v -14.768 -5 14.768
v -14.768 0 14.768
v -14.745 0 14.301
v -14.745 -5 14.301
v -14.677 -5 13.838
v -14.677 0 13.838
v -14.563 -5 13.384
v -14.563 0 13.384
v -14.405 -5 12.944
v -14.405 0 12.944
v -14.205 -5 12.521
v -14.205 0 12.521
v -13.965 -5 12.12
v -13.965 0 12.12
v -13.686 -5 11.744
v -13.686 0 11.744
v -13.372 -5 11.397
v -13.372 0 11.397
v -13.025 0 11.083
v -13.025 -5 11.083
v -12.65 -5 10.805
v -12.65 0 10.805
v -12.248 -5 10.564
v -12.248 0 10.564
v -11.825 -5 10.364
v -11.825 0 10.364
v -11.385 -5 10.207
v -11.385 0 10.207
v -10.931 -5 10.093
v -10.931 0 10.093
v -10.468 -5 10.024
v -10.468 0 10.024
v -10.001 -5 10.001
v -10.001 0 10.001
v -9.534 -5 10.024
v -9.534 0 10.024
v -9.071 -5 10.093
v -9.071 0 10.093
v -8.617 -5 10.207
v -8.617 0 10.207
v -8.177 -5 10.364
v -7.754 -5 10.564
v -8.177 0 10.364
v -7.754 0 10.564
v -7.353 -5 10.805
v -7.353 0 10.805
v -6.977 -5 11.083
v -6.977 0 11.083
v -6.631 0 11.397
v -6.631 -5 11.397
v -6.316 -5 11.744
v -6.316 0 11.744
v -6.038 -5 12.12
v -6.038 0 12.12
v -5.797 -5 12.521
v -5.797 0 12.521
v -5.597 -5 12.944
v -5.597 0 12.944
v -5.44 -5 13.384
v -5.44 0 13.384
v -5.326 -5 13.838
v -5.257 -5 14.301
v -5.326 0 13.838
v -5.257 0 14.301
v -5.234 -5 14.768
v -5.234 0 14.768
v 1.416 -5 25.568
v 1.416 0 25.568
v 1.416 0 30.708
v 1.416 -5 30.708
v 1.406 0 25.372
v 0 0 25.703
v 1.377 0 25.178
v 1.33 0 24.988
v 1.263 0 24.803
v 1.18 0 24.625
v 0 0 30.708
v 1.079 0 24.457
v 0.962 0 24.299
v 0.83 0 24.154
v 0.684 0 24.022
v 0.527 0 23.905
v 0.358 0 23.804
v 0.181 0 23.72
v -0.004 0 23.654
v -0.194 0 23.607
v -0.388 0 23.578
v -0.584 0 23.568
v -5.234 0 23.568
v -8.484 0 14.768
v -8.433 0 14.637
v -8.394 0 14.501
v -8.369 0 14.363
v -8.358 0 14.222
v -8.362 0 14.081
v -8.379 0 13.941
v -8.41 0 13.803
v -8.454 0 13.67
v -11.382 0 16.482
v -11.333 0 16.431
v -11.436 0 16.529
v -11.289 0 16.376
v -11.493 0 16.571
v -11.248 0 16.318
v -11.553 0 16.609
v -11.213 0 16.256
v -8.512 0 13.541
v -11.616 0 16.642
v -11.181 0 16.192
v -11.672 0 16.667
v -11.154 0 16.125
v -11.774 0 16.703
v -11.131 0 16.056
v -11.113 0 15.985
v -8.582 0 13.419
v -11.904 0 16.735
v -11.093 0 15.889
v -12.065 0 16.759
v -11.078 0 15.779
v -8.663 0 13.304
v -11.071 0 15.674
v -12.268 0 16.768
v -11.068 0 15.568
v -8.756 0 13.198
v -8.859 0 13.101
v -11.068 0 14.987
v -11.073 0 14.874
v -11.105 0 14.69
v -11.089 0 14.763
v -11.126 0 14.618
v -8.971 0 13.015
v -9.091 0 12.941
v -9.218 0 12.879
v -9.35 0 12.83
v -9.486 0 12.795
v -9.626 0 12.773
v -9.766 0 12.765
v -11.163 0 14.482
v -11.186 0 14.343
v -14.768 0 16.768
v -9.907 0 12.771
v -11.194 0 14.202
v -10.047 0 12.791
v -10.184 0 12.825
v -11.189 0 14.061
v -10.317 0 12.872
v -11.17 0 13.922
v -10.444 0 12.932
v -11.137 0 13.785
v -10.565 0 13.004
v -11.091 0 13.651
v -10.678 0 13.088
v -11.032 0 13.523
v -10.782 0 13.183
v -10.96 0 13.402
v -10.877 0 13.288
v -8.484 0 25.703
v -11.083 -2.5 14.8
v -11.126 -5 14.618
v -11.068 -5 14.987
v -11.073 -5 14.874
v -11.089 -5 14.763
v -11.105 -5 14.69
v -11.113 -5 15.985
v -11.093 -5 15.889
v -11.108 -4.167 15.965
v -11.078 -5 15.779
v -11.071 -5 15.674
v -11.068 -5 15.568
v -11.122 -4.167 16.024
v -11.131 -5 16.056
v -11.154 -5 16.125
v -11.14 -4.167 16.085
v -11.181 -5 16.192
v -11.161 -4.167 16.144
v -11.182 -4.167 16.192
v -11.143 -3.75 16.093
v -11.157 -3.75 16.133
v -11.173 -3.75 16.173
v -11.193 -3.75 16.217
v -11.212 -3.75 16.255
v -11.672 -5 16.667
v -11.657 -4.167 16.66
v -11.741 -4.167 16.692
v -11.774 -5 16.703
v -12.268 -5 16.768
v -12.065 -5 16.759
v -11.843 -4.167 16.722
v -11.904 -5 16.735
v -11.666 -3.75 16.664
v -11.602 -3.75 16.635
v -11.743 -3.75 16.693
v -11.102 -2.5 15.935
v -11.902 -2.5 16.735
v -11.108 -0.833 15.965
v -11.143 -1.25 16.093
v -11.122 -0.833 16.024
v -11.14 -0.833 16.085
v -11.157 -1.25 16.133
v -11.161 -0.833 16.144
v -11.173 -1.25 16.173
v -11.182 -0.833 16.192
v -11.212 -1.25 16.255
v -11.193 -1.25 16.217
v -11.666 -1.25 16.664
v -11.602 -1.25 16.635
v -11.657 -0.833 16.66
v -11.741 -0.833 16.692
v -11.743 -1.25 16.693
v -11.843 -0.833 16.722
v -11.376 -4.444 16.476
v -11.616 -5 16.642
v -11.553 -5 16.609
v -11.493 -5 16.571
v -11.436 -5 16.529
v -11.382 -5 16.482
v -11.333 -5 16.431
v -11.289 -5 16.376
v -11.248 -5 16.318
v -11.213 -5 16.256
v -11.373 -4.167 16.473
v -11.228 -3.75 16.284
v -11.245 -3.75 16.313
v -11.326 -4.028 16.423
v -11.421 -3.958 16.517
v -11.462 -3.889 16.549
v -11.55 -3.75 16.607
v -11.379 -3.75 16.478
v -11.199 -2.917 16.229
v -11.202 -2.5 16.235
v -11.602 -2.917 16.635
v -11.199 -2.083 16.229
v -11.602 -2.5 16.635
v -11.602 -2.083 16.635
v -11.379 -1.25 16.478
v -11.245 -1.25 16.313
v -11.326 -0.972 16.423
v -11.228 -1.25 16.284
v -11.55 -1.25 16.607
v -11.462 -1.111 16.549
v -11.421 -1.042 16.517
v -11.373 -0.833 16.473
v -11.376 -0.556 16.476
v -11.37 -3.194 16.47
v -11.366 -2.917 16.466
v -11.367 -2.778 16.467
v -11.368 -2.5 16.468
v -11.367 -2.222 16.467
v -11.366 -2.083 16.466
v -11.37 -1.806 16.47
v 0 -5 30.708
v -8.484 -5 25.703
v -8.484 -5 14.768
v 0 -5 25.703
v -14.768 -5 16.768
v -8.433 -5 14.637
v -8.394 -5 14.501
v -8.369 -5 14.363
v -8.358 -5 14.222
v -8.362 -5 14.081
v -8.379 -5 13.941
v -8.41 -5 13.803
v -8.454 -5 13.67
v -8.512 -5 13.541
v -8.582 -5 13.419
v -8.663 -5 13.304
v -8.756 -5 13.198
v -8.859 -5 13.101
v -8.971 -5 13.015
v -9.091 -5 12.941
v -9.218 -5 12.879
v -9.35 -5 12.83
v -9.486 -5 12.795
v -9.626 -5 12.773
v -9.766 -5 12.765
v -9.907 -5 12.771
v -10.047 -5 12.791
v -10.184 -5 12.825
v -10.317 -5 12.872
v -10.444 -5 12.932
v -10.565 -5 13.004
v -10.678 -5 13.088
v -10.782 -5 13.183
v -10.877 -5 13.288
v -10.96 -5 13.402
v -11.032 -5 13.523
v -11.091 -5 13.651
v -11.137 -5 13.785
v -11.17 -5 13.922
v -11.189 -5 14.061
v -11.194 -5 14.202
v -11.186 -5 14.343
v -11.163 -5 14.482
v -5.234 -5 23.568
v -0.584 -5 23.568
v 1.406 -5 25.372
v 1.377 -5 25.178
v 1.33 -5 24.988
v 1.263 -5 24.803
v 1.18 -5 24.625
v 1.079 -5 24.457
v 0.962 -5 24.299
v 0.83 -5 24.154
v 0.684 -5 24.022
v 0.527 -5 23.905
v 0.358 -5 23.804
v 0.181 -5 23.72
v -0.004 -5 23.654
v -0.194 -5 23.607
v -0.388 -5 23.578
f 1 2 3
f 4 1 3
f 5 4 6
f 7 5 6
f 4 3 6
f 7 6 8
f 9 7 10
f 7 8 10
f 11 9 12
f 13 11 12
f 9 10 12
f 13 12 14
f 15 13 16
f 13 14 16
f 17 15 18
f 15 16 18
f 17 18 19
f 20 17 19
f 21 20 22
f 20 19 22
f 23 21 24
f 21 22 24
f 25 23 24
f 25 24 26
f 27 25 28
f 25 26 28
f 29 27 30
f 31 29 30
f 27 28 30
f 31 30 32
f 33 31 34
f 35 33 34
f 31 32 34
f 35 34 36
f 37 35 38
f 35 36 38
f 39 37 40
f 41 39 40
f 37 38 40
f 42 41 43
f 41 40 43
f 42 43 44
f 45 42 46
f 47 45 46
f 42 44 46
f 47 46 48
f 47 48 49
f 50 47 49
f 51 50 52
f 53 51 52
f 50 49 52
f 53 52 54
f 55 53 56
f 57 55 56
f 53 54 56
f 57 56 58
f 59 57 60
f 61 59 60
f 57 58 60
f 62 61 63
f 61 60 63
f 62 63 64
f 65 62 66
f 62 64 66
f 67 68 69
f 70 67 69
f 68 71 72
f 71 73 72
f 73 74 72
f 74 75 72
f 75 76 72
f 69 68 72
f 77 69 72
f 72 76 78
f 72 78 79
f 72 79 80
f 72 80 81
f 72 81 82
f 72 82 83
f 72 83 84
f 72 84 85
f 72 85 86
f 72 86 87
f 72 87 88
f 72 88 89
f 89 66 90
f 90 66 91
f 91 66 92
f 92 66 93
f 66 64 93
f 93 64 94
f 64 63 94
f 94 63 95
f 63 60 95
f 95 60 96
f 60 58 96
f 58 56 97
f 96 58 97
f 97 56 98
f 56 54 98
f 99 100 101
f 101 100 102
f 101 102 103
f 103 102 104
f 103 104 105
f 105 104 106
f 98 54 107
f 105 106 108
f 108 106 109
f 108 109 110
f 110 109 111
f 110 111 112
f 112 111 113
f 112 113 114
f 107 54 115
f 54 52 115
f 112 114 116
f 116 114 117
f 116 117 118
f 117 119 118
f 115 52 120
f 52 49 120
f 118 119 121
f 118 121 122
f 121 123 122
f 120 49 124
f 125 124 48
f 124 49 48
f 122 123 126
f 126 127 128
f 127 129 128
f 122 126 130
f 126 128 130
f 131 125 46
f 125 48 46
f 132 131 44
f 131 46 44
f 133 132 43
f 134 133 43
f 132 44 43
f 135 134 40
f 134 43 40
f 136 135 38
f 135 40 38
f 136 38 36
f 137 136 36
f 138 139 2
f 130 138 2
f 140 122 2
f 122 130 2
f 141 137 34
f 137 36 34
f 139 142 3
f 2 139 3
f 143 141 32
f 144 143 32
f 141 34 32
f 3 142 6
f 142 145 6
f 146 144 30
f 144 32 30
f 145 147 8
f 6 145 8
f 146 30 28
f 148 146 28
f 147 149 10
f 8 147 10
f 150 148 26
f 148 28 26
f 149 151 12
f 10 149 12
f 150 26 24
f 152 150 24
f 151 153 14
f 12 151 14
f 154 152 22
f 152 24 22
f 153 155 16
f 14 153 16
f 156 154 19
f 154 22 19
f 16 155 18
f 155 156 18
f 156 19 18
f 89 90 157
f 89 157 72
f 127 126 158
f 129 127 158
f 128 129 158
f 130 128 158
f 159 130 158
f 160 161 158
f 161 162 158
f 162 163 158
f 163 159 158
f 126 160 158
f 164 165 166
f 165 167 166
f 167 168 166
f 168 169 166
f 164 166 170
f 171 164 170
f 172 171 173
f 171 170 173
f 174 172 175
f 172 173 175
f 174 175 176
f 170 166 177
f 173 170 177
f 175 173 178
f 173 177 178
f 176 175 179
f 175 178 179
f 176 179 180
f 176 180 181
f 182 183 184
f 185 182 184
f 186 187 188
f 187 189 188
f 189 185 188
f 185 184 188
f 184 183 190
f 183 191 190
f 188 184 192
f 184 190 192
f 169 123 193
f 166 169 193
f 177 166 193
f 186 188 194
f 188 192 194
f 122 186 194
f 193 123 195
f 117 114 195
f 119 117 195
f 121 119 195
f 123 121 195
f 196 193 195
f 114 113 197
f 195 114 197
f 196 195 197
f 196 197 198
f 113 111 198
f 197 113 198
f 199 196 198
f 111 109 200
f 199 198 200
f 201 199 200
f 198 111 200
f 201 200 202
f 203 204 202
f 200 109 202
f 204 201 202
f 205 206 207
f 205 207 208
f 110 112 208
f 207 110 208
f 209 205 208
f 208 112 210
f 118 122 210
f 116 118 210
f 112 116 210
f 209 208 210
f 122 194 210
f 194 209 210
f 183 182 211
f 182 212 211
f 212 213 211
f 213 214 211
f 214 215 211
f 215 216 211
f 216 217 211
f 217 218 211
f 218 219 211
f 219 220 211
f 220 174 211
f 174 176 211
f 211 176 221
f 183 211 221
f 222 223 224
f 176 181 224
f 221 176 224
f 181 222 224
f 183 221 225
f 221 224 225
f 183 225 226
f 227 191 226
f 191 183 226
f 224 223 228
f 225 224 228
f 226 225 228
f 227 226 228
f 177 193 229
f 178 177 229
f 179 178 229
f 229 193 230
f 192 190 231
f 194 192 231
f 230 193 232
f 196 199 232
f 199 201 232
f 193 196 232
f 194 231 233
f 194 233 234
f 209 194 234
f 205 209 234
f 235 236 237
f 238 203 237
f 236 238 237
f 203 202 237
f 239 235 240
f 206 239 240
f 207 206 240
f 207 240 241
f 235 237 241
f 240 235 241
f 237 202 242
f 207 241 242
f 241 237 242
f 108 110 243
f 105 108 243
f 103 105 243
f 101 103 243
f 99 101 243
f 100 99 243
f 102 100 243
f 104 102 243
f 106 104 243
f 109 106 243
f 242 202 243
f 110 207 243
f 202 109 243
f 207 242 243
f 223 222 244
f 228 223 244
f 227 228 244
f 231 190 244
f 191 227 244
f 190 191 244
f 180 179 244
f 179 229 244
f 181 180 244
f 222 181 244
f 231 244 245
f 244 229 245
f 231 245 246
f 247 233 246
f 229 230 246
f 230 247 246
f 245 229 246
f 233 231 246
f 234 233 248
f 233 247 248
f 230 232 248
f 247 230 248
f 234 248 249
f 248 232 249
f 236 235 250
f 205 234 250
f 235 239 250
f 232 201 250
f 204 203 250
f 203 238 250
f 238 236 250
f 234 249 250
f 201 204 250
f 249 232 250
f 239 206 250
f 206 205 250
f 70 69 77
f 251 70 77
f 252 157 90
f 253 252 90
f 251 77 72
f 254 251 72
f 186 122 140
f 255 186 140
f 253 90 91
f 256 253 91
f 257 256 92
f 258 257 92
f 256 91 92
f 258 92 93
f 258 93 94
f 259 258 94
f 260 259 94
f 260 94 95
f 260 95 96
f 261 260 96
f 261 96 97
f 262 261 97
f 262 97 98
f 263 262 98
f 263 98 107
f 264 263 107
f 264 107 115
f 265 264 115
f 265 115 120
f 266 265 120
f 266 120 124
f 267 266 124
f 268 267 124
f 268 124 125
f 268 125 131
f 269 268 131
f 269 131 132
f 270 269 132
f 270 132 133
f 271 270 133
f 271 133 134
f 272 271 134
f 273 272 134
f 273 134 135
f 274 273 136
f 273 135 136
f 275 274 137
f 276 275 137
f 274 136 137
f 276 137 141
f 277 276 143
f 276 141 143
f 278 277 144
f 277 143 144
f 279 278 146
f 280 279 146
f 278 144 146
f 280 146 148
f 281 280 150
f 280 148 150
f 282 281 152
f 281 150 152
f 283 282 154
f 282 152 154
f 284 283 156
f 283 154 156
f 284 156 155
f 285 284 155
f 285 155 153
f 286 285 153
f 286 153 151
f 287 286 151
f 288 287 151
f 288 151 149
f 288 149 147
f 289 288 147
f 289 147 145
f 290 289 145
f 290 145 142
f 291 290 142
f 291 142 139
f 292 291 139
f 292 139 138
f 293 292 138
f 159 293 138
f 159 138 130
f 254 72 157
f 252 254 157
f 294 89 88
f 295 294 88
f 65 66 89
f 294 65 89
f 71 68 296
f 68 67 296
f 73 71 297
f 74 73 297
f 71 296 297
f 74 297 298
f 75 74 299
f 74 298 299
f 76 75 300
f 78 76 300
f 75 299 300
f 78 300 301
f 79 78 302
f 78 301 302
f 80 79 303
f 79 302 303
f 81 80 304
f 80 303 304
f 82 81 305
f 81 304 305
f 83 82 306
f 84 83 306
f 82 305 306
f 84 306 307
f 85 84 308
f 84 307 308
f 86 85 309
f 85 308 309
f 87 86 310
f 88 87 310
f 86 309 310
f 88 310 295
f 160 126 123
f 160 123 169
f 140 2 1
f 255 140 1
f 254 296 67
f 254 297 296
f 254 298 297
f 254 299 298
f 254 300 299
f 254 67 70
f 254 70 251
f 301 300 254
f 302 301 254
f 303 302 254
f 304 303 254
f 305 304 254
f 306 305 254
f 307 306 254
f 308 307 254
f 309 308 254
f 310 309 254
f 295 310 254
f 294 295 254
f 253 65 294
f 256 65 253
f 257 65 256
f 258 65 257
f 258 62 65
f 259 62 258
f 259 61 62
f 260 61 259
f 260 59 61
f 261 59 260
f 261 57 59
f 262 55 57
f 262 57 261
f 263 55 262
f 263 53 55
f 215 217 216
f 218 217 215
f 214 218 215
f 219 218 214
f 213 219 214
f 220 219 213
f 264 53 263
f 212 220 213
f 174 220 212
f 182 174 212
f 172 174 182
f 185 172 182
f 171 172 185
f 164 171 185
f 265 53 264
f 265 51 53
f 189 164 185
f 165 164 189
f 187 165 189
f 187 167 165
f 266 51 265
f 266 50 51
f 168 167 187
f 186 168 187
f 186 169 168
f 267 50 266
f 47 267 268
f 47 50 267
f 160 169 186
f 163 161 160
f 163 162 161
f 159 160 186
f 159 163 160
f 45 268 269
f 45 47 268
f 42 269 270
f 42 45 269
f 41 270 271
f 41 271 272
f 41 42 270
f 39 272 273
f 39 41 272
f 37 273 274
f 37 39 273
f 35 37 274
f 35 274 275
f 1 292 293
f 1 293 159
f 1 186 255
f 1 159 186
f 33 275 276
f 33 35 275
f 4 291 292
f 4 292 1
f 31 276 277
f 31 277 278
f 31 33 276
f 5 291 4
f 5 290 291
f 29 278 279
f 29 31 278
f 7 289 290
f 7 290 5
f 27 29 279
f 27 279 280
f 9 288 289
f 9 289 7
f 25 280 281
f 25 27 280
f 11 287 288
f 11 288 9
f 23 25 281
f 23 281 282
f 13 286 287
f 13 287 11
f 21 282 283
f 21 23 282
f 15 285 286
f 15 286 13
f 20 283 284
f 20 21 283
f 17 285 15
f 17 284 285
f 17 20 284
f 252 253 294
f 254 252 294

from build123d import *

# Parameters (mm, degrees)
F1_DEPTH    = 5
F2_R        = 2
F3_DEPTH    = 2
F4_T1_DEPTH = 11
F4_T3_DEPTH = 6.0917941426


# Not quite as in the source:
# - a fillet or chamfer that OpenCascade refuses, or shapes differently, is made with other operations: its cross-section is extruded or revolved along the edge and cut away or added


with BuildPart() as f1:
    # F0 (on Front) → F1 (new body)
    with BuildSketch(Plane.XZ):
        with BuildLine():
            Line((1.4157007724, 23.5682009265), (1.4157007724, 30.7082009265))
            Line((1.4157007724, 30.7082009265), (0, 30.7082009265))
            Line((0, 30.7082009265), (0, 29.0815811604))
            Line((0, 29.0815811604), (0, 25.7029440254))
            Line((0, 25.7029440254), (-8.4842955694, 25.7029440254))
            Line((-8.4842955694, 25.7029440254), (-8.4842955694, 14.7682009265))
            ThreePointArc((-8.4842955694, 14.7682009265), (-9.7762482479, 12.7647114857), (-11.0682009265, 14.7682009265))
            Line((-11.0682009265, 14.7682009265), (-14.7682009265, 14.7682009265))
            ThreePointArc((-14.7682009265, 14.7682009265), (-10.001250077, 10.001250077), (-5.2342992276, 14.7682009265))
            Line((-5.2342992276, 14.7682009265), (-5.2342992276, 23.5682009265))
            Line((-5.2342992276, 23.5682009265), (1.4157007724, 23.5682009265))
        make_face()
    extrude(amount=F1_DEPTH)

    # F2
    f2_edges = [f1.edges().sort_by_distance(p)[0] for p in [
        (1.415701, -2.5, 23.568201),
    ]]
    fillet(f2_edges, radius=F2_R)

    # F3 (add): a face of the model
    f3_faces = [f1.faces().sort_by_distance(p)[0] for p in [
        (-12.9182009265, -2.5, 14.7682009265),
    ]]
    extrude(f3_faces, amount=F3_DEPTH)

    # F4: fillet of radius 1.2 on 2 edges, made by hand

    # F4_s2 → F4_t1 (cut)
    with BuildSketch(Plane.XZ.offset(-3)):
        with BuildLine():
            add(Edge.make_bspline(
                [(-11.0682009265, 15.5682009265), (-11.0682009265, 16.7682009265), (-12.2682009265, 16.7682009265)],
                knots=[0, 0, 0, 1, 1, 1], degree=2, weights=[1, 1, 1]))
            Line((-12.2682009265, 16.7682009265), (-11.0682009265, 16.7682009265))
            Line((-11.0682009265, 16.7682009265), (-11.0682009265, 15.5682009265))
        make_face()
    extrude(amount=F4_T1_DEPTH, mode=Mode.SUBTRACT)

    # F4_s4 → F4_t3 (cut)
    with BuildSketch(Plane.XZ.offset(-0.5458970713)):
        with BuildLine():
            add(Edge.make_bspline(
                [(-11.1261089729, 14.6182854421), (-11.0682009265, 14.7978698213), (-11.0682009265, 14.986559755)],
                knots=[0, 0, 0, 1, 1, 1], degree=2, weights=[1, 1, 1]))
            Line((-11.0682009265, 14.986559755), (-11.0682009265, 14.7682009265))
            ThreePointArc((-11.0682009265, 14.7682009265), (-11.0992800608, 14.6940640537), (-11.1261089729, 14.6182854421))
        make_face()
    extrude(amount=F4_T3_DEPTH, mode=Mode.SUBTRACT)


solid = f1.part
